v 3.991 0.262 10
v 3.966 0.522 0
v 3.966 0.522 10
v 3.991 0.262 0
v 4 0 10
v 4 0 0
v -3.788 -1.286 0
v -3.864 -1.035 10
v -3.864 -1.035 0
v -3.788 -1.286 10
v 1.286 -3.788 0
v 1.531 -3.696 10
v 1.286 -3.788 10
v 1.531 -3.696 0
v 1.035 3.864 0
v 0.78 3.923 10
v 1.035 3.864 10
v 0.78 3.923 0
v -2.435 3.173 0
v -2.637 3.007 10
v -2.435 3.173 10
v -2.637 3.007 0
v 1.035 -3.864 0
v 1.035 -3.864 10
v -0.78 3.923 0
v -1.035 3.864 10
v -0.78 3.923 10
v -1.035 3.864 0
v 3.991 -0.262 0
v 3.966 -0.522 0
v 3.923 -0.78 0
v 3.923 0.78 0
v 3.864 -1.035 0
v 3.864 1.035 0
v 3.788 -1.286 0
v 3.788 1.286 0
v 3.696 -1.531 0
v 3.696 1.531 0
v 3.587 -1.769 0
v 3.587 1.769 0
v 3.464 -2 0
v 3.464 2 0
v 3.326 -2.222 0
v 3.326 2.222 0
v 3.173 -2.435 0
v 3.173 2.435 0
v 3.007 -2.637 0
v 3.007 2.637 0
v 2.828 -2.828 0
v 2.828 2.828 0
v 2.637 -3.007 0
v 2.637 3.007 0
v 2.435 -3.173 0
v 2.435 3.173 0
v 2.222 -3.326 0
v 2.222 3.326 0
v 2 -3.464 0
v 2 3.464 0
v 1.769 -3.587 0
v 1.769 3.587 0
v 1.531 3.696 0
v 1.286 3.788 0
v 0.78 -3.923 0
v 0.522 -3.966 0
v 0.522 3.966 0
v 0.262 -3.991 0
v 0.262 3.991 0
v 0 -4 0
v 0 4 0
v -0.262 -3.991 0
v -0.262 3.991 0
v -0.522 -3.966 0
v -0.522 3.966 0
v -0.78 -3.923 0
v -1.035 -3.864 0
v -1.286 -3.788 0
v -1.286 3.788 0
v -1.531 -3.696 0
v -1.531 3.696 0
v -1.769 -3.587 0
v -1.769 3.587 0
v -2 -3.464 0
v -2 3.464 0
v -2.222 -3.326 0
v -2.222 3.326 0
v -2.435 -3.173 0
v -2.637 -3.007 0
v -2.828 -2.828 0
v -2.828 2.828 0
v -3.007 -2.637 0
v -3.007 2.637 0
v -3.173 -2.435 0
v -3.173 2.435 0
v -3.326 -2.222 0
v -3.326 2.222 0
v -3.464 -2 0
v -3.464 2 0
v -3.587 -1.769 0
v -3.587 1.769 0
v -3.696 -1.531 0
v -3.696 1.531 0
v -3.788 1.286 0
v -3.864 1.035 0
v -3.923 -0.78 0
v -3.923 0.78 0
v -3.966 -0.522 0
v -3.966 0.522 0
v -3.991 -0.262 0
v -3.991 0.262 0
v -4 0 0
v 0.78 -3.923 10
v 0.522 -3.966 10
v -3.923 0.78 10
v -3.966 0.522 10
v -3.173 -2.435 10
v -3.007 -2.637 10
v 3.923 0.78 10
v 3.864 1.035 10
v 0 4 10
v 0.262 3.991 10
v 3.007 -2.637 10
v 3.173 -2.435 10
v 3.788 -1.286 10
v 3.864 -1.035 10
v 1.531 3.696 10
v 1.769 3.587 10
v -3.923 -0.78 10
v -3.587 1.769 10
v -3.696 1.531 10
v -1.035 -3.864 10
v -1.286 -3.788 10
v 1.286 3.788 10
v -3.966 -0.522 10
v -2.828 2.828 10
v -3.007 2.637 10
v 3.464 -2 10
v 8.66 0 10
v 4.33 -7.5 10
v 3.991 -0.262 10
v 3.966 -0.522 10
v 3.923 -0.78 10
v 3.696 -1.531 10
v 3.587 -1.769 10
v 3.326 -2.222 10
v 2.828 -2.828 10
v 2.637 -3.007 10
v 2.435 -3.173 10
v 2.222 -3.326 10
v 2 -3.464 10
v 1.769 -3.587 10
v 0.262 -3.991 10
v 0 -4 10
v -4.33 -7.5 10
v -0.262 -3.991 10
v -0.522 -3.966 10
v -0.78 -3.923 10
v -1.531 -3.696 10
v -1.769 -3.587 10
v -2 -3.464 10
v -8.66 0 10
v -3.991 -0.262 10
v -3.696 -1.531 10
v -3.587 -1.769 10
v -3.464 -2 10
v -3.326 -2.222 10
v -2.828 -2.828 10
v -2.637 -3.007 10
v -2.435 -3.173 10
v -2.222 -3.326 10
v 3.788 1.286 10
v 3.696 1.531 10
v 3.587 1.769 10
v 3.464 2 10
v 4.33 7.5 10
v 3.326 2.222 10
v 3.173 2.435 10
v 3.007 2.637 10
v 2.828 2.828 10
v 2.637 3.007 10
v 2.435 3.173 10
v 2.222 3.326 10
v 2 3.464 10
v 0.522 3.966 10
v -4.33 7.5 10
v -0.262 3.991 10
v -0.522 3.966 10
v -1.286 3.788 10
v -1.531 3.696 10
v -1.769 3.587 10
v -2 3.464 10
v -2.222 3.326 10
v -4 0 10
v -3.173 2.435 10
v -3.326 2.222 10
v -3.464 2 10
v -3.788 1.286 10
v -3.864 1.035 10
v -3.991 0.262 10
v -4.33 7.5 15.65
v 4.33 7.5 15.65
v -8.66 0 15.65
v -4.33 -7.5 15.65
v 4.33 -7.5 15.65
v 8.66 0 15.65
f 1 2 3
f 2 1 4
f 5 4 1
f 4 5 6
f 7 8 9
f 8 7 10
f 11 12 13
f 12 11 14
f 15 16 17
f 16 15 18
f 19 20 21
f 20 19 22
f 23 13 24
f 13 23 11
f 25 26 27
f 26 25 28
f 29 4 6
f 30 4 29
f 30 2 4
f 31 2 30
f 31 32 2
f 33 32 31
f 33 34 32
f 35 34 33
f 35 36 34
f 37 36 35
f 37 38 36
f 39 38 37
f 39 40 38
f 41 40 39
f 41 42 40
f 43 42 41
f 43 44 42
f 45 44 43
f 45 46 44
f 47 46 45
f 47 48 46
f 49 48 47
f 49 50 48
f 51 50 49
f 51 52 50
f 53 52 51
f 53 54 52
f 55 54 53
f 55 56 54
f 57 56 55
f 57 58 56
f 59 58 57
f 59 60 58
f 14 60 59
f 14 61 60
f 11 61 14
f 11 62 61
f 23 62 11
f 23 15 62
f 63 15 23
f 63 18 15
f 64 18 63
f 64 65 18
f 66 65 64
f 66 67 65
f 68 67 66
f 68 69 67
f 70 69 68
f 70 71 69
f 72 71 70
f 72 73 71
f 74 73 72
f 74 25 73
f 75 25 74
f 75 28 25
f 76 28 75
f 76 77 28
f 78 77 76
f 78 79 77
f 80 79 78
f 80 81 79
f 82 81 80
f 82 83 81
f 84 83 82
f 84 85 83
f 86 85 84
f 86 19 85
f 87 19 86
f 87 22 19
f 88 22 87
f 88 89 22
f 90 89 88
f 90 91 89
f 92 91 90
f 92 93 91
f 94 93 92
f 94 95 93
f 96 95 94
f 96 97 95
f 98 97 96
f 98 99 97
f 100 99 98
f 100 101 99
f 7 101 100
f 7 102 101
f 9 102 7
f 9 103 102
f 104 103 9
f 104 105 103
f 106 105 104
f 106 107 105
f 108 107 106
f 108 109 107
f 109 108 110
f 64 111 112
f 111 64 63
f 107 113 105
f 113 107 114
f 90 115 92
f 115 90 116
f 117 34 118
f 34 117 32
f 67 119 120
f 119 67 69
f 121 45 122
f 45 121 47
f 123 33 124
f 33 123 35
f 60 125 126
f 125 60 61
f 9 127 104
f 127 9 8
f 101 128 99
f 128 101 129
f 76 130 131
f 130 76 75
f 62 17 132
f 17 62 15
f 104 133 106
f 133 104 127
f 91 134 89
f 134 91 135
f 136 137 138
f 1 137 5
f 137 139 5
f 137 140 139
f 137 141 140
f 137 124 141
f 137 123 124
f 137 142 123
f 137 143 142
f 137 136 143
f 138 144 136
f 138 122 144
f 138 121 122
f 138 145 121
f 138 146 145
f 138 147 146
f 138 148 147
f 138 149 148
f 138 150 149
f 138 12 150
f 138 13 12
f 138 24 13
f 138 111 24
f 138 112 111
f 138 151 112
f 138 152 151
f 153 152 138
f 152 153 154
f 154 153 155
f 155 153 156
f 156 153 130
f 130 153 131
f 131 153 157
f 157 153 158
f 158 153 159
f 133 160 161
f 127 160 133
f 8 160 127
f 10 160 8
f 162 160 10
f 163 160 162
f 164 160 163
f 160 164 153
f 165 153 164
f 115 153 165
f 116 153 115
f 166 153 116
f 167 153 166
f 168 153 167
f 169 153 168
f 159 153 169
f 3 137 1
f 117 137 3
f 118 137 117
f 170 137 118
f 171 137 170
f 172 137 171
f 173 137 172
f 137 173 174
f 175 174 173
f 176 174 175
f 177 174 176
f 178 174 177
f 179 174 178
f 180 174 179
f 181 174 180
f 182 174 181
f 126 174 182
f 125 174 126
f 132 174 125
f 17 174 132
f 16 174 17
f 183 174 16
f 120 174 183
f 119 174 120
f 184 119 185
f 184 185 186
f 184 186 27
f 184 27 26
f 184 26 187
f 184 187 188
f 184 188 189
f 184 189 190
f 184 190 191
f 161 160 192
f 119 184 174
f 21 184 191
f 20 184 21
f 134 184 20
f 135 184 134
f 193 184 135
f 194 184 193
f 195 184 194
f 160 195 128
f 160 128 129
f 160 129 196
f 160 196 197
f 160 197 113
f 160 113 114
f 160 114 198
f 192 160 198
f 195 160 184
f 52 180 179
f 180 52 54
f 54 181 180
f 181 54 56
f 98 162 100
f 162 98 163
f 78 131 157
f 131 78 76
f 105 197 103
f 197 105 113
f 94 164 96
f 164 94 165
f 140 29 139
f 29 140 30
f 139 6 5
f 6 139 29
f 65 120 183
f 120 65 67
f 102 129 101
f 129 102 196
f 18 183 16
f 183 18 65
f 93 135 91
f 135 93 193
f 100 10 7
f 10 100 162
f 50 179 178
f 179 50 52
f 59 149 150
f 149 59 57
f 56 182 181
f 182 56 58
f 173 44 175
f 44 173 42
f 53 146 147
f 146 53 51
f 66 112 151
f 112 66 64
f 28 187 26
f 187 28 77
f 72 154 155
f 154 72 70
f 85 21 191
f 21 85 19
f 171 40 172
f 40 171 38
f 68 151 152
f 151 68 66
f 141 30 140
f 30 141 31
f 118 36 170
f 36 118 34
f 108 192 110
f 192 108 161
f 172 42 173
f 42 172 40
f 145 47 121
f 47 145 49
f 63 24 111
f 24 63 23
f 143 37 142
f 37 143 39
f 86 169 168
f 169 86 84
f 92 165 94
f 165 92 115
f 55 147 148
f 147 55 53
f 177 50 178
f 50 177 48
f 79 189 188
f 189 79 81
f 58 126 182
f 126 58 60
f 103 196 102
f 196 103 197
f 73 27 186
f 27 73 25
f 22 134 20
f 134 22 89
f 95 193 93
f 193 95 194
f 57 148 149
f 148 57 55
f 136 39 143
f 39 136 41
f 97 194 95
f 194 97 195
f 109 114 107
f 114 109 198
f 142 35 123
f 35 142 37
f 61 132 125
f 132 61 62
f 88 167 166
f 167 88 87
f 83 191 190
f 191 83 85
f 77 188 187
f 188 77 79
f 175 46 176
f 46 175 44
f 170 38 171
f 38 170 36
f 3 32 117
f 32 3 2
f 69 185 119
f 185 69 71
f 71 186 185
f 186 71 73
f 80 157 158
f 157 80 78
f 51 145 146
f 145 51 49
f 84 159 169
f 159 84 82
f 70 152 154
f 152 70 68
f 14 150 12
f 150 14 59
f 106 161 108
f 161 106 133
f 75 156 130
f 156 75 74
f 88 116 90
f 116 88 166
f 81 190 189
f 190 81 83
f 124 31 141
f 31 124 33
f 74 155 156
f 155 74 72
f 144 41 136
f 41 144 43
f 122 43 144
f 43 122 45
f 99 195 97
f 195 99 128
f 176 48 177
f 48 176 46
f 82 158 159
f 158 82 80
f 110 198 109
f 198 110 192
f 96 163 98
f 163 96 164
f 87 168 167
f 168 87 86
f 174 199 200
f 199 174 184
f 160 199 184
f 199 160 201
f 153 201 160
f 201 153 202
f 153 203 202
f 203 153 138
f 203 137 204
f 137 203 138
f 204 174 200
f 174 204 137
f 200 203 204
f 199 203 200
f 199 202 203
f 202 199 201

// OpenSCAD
$fn = 96;

shaft_d = 8.0;
shaft_len = 10.0;

head_flat_d = 15.0;   // across flats
head_h = 5.65;

module hex_prism(af, h) {
    // Regular hexagon: across-flats = 2*apothem
    // Circumradius R = af / sqrt(3)
    R = af / sqrt(3);
    linear_extrude(height = h)
        polygon(points = [for (i = [0:5]) [R*cos(60*i), R*sin(60*i)]]);
}

union() {
    // Shaft
    cylinder(d = shaft_d, h = shaft_len);

    // Hex head on top of shaft
    translate([0,0,shaft_len])
        hex_prism(head_flat_d, head_h);
}
